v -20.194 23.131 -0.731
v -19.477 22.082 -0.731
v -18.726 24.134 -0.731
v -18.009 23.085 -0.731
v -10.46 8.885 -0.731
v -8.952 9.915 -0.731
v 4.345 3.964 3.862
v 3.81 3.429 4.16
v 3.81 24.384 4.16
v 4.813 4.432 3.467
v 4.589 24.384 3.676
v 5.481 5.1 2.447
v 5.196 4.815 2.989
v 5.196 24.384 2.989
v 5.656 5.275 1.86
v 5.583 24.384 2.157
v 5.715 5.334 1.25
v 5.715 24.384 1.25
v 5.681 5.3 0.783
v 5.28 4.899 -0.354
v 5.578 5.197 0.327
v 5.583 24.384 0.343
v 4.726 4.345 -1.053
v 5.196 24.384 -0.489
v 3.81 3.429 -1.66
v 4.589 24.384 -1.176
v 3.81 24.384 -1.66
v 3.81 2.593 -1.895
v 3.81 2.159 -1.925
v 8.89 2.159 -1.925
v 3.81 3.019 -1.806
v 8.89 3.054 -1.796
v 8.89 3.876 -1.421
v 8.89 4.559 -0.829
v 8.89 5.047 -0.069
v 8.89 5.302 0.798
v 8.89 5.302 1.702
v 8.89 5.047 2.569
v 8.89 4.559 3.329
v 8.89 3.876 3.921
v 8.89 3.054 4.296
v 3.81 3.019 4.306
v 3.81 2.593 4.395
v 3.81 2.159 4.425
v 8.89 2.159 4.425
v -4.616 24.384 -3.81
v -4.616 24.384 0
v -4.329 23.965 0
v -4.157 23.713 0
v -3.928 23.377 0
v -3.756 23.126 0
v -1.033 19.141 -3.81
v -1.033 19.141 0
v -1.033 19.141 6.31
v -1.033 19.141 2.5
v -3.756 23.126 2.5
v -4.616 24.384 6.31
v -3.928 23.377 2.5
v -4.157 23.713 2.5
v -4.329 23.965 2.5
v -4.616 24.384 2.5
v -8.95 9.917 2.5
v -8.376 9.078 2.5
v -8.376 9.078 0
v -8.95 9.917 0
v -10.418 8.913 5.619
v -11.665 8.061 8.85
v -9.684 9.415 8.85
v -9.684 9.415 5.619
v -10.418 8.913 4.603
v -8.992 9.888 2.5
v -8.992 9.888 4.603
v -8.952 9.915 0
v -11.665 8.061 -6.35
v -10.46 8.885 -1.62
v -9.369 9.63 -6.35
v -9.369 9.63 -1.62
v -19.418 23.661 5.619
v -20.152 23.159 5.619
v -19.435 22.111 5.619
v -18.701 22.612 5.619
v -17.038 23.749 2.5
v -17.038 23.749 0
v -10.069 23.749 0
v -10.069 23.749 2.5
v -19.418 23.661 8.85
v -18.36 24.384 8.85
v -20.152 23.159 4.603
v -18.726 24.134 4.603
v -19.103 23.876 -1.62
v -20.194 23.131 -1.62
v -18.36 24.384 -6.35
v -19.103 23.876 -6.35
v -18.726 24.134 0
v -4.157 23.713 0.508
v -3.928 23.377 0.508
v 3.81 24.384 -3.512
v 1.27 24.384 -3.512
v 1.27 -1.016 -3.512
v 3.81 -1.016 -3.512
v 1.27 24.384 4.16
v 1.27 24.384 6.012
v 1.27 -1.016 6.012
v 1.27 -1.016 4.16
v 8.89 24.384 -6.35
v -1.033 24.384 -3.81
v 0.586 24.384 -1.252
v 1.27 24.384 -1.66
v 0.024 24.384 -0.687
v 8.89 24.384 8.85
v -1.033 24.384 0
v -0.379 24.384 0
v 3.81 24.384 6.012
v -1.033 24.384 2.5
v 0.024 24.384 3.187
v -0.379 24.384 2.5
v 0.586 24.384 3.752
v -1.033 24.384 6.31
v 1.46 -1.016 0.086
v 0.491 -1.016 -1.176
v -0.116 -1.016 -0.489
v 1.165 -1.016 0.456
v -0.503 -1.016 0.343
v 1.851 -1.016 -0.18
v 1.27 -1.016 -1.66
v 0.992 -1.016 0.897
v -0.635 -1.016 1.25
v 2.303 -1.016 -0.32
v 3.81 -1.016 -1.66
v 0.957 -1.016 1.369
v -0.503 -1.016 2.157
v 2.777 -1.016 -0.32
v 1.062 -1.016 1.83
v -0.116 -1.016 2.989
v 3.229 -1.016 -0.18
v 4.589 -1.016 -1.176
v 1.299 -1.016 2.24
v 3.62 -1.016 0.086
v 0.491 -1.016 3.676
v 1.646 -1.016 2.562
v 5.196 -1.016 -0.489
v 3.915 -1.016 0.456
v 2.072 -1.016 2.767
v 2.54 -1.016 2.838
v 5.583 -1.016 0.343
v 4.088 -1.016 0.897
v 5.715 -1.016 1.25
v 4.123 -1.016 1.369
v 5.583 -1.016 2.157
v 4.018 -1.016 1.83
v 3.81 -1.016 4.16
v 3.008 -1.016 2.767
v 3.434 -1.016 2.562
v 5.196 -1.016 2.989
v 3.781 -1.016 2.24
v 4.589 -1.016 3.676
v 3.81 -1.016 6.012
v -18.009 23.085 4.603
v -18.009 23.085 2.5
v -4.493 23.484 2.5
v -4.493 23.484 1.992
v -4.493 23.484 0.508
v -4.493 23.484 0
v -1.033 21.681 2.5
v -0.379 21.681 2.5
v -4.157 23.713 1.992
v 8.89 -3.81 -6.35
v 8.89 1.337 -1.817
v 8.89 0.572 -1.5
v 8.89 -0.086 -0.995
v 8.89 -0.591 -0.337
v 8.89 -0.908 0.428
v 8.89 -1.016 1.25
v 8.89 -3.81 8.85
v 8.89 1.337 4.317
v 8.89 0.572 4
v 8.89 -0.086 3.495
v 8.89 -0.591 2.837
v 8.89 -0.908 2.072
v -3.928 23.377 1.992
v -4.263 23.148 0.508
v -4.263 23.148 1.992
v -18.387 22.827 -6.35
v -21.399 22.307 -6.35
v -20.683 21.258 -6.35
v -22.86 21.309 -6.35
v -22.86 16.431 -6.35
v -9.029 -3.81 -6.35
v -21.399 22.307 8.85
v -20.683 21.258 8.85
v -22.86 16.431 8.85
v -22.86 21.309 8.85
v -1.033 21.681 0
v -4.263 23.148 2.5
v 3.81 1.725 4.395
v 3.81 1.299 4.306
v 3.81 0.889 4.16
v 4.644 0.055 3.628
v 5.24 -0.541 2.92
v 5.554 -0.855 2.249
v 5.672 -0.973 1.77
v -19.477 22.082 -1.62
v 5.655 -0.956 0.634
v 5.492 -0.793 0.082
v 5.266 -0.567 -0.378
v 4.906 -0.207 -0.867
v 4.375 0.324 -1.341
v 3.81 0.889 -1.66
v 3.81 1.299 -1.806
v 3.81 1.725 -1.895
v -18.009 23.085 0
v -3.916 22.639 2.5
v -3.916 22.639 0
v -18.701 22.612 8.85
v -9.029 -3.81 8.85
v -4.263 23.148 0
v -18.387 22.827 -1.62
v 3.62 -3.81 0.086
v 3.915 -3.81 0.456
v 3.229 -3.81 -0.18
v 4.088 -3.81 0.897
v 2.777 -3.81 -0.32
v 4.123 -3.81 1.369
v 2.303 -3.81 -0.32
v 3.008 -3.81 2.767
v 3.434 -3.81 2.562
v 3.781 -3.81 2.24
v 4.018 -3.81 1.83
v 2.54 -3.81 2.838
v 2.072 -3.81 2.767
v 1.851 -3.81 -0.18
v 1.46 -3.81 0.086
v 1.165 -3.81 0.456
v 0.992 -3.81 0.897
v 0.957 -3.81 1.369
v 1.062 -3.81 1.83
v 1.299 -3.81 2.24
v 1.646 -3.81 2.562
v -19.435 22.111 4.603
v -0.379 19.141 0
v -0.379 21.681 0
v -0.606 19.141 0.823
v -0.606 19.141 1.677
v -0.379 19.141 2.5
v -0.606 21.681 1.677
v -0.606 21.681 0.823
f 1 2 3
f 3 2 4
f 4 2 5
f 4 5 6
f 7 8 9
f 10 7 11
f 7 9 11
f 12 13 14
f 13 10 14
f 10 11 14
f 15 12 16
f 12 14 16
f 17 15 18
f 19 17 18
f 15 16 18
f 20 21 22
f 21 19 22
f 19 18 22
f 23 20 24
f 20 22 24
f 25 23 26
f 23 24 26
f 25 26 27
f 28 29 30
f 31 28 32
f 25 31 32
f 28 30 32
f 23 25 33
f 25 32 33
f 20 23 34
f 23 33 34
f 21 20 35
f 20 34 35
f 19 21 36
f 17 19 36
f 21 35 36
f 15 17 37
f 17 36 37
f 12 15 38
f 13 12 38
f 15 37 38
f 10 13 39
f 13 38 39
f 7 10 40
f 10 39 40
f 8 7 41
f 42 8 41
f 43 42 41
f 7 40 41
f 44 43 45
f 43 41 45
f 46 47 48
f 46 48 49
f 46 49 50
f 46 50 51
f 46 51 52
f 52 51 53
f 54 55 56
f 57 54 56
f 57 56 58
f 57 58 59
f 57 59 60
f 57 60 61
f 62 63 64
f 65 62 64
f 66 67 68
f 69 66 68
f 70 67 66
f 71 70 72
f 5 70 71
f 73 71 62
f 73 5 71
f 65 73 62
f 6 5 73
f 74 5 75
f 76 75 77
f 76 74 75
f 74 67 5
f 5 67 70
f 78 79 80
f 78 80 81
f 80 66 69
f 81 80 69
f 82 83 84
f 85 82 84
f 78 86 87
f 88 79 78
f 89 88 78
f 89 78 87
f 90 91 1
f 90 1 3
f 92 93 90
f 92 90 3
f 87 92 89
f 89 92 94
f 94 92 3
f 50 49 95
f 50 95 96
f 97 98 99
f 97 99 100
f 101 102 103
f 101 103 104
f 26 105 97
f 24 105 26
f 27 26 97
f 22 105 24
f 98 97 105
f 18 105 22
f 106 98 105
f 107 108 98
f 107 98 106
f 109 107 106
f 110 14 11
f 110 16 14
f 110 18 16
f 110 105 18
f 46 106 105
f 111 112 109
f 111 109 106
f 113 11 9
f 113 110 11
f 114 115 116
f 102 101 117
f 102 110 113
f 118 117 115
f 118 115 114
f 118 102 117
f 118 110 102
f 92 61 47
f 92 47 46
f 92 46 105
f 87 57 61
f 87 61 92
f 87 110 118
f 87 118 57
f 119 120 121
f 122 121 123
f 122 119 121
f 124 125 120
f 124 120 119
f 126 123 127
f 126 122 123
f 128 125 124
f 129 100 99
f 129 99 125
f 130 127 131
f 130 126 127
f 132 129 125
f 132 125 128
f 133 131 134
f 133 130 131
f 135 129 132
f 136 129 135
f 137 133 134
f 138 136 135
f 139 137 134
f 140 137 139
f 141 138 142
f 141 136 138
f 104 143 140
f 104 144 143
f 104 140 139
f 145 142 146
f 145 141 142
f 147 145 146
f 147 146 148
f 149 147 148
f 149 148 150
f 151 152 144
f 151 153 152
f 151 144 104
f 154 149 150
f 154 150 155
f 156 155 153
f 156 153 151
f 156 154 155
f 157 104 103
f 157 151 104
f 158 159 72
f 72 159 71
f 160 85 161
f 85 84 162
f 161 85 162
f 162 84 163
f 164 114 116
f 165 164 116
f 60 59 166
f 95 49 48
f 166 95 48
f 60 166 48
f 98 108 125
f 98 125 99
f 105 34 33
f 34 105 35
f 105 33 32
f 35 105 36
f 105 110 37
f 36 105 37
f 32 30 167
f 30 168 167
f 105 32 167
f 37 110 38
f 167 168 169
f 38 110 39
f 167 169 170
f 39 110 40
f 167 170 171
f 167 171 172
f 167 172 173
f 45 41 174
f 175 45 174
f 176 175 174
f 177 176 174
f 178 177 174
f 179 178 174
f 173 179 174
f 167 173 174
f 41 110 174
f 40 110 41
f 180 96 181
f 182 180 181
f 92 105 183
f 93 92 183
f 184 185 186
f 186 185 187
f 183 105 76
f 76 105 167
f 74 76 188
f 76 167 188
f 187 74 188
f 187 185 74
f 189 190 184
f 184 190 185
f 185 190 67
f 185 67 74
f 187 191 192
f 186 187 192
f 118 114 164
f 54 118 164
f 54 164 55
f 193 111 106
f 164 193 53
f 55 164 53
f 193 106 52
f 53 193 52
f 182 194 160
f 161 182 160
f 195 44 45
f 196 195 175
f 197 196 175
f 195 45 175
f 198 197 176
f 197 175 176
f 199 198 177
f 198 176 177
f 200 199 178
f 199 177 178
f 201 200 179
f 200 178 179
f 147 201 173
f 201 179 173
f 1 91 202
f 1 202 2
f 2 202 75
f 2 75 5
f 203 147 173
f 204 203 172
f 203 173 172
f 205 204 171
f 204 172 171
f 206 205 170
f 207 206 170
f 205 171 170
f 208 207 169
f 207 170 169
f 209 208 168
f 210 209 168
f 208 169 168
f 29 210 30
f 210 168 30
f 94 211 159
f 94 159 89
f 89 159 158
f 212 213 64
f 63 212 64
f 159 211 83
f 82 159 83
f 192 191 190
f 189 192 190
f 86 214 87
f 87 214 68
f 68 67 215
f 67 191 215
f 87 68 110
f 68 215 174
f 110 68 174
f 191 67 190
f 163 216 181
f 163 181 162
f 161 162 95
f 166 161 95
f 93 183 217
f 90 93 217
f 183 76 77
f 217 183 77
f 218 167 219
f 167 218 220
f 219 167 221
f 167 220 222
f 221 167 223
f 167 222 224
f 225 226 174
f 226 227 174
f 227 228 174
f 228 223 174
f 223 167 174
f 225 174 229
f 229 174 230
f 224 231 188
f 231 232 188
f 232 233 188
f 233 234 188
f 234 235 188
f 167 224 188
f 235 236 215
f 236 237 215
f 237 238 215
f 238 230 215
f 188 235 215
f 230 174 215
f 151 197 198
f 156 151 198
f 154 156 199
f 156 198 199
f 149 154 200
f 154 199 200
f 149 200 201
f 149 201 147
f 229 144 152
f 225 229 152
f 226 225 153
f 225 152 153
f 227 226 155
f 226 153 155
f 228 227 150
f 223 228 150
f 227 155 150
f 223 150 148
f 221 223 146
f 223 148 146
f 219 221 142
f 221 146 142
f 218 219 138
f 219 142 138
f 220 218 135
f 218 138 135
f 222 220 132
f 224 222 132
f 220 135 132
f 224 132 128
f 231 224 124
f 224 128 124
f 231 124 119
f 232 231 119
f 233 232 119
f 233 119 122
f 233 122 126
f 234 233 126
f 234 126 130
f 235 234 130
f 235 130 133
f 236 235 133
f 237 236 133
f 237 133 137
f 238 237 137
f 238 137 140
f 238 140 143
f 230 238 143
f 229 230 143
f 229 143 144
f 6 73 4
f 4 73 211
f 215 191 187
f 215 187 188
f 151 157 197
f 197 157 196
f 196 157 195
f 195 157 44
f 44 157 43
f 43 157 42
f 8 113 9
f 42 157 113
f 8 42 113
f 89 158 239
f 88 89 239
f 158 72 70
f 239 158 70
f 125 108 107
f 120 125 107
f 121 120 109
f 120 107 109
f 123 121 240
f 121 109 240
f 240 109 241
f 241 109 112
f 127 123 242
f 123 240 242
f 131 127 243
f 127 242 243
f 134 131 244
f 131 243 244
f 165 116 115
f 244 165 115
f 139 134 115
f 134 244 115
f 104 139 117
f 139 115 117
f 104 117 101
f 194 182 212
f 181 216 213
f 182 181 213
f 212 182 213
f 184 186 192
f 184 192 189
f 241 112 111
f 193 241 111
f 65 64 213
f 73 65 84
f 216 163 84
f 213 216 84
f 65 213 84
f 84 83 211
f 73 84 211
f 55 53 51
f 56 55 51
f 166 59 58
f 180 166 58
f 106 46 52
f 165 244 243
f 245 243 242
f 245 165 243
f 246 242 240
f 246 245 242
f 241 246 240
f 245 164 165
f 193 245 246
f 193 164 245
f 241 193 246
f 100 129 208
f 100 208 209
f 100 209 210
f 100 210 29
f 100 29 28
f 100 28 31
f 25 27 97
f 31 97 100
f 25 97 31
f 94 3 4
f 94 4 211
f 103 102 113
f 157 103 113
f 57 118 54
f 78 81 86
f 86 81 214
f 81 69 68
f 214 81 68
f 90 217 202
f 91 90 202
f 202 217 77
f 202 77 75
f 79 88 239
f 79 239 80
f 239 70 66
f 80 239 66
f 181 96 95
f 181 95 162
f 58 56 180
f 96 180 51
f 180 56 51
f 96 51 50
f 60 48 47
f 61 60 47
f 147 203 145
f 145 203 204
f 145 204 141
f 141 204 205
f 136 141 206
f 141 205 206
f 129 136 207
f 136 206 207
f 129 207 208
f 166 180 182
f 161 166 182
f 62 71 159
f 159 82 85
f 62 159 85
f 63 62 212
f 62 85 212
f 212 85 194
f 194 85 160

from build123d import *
from build123d.topology import SkipClean

# Parameters (mm, degrees)
BOSS_EXTRUDE1_DEPTH     = 2.5
BOSS_EXTRUDE1_2_DEPTH   = 2.5
BOSS_EXTRUDE2_DEPTH     = 6.35
BOSS_EXTRUDE3_DEPTH     = 6.35
SKETCH4_R               = 3.175
CUT_EXTRUDE1_DEPTH      = 25.4
SKETCH5_R               = 1.5875
CUT_EXTRUDE2_DEPTH      = 25.4
CUT_EXTRUDE3_DEPTH      = 25.4
CUT_EXTRUDE4_REACH      = 43
CUT_EXTRUDE4_END_RADIUS = 3.175
CUT_EXTRUDE5_REACH      = 39.36
SKETCH8_W               = 2.54
SKETCH8_H               = 9.525
SKETCH9_W               = 0.7112
SKETCH9_H               = 15.2
BOSS_EXTRUDE4_DEPTH     = 17
BOSS_EXTRUDE5_DEPTH     = 1.016
SKETCH11_W              = 1.176658287
SKETCH11_H              = 2.5
SKETCH11_W_2            = 2.636987944
SKETCH11_H_2            = 15.2
BOSS_EXTRUDE6_DEPTH     = 1.27
CUT_EXTRUDE6_DEPTH      = 38.864332241
BOSS_EXTRUDE7_START     = 2.54
BOSS_EXTRUDE7_DEPTH     = 2.54
BOSS_EXTRUDE8_DEPTH     = 2.54
BOSS_EXTRUDE9_DEPTH     = 0.508
BOSS_EXTRUDE10_DEPTH    = 0.508
CUT_EXTRUDE7_DEPTH      = 3.81
CUT_EXTRUDE8_DEPTH      = 3.81
BOSS_EXTRUDE11_DEPTH    = 3.81


with BuildPart() as part:
    # Sketch1 → Boss-Extrude1 (new body)
    with BuildSketch(Plane.XY):
        Polygon((5.08, 0), (0, 0), (0, 19.141079028), (-1.033059908, 19.141079028), (-3.75575709, 23.125698967), (-8.376397661, 9.077684872), (-11.679025045, 6.820994294), (-21.26996, 20.857160675), (-22.86, 19.770683798), (-22.86, -3.81), (8.89, -3.81), (8.89, 24.384), (5.08, 24.384), align=None)
    extrude(amount=BOSS_EXTRUDE1_DEPTH)



with BuildPart() as body_2:
    # Sketch1 → Boss-Extrude1 2 (new body)
    with BuildSketch(Plane.XY):
        Polygon((-10.069369191, 23.749), (-4.328956497, 23.964566322), (-4.615556201, 24.384), (-16.108492032, 24.384), (-17.03780348, 23.749), align=None)
    extrude(amount=BOSS_EXTRUDE1_2_DEPTH)


with BuildPart() as part_1:
    add(part.part)

    add(body_2.part)  # Boss-Extrude2 merges body 2
    # Sketch2 → Boss-Extrude2 (add)
    with BuildSketch(Plane.XY.offset(2.5)):
        Polygon((-11.679025045, 6.820994294), (-21.26996, 20.857160675), (-22.86, 19.770683798), (-22.86, -3.81), (8.89, -3.81), (8.89, 24.384), (5.08, 24.384), (5.08, 0), (0, 0), (0, 19.141079028), (-1.033059908, 19.141079028), (-3.75575709, 23.125698967), (-8.376397661, 9.077684872), align=None)
        Polygon((-16.108492032, 24.384), (-18.00931945, 23.085161582), (-8.418384495, 9.048995201), (-8.376397661, 9.077684872), (-3.75575709, 23.125698967), (-1.033059908, 19.141079028), (0, 19.141079028), (0, 0), (5.08, 0), (5.08, 24.384), align=None)
    extrude(amount=BOSS_EXTRUDE2_DEPTH)

    # Sketch3 → Boss-Extrude3 (add)
    with BuildSketch(Plane(origin=(0, 0, 0), x_dir=(-1, 0, 0), z_dir=(0, 0, -1))):
        Polygon((-8.89, 24.384), (-8.89, -3.81), (22.86, -3.81), (22.86, 19.770683798), (21.26996, 20.857160675), (11.679025045, 6.820994294), (8.376397661, 9.077684872), (18.00931945, 23.085161582), (16.108492032, 24.384), align=None)
    extrude(amount=BOSS_EXTRUDE3_DEPTH)

    # Sketch4 → Cut-Extrude1 (cut)
    with BuildSketch(Plane(origin=(0, 24.384, 0), x_dir=(1, 0, 0), z_dir=(0, 1, 0))):
        with Locations(Location((2.54, -1.25, 0), (0, 0, 270))):
            Circle(SKETCH4_R)
    extrude(amount=-CUT_EXTRUDE1_DEPTH, mode=Mode.SUBTRACT)

    # Sketch5 → Cut-Extrude2 (cut)
    with BuildSketch(Plane(origin=(0, -1.016, 0), x_dir=(1, 0, 0), z_dir=(0, 1, 0))):
        with Locations(Location((2.54, -1.25, 0), (0, 0, 270))):
            Circle(SKETCH5_R)
    extrude(amount=-CUT_EXTRUDE2_DEPTH, mode=Mode.SUBTRACT)

    # Sketch6 → Cut-Extrude3 (cut)
    with BuildSketch(Plane.XY.offset(8.85)):
        Polygon((-22.86, 16.430904611), (-9.029357481, -3.81), (-22.86, -3.81), align=None)
    extrude(amount=-CUT_EXTRUDE3_DEPTH, mode=Mode.SUBTRACT)

    # Cut-Extrude4: up to this cylinder (the profile starts outside it)
    with SkipClean():  # the faces are left unmerged after this step: merging them gives an invalid solid
        cut_extrude4_end = Plane(origin=(2.54, 2.159, 1.25), z_dir=(0, 1, 0)) * Cylinder(CUT_EXTRUDE4_END_RADIUS, 96.045024, mode=Mode.PRIVATE)
        # Sketch7 → Cut-Extrude4 (cut, up to the surface)
        with BuildSketch(Plane(origin=(8.89, 0, 0), x_dir=(0, 0, -1), z_dir=(1, 0, 0)), mode=Mode.PRIVATE) as cut_extrude4_sk1:
            with BuildLine():
                ThreePointArc((1.925, 2.159), (-1.25, 5.334), (-4.425, 2.159))
                Line((-4.425, 2.159), (1.925, 2.159))
            make_face()
        cut_extrude4_tool1 = extrude(cut_extrude4_sk1.sketch, amount=-CUT_EXTRUDE4_REACH, mode=Mode.PRIVATE) - cut_extrude4_end
        add(cut_extrude4_tool1.solids().sort_by_distance((8.89, 3.506512, 1.25))[0], mode=Mode.SUBTRACT)
        # Sketch7 → Cut-Extrude4 (cut, up to the surface)
        with BuildSketch(Plane(origin=(8.89, 0, 0), x_dir=(0, 0, -1), z_dir=(1, 0, 0)), mode=Mode.PRIVATE) as cut_extrude4_sk2:
            with BuildLine():
                Line((1.925, 2.159), (-4.425, 2.159))
                ThreePointArc((-4.425, 2.159), (-3.49506403, -0.08606403), (-1.25, -1.016))
                ThreePointArc((-1.25, -1.016), (0.99506403, -0.08606403), (1.925, 2.159))
            make_face()
        cut_extrude4_tool2 = extrude(cut_extrude4_sk2.sketch, amount=-CUT_EXTRUDE4_REACH, mode=Mode.PRIVATE) - cut_extrude4_end
        add(cut_extrude4_tool2.solids().sort_by_distance((8.89, 0.811488, 1.25))[0], mode=Mode.SUBTRACT)
        # Sketch7 → Cut-Extrude4 (cut, up to the surface)
        with BuildSketch(Plane(origin=(8.89, 0, 0), x_dir=(0, 0, -1), z_dir=(1, 0, 0)), mode=Mode.PRIVATE) as cut_extrude4_sk3:
            with BuildLine():
                ThreePointArc((1.925, 2.159), (-1.25, 5.334), (-4.425, 2.159))
                Line((-4.425, 2.159), (1.925, 2.159))
            make_face()
        cut_extrude4_tool3 = extrude(cut_extrude4_sk3.sketch, amount=-CUT_EXTRUDE4_REACH, mode=Mode.PRIVATE) - cut_extrude4_end
        add(cut_extrude4_tool3.solids().sort_by_distance((8.89, 3.506512, 1.25))[0], mode=Mode.SUBTRACT)
        # Sketch7 → Cut-Extrude4 (cut, up to the surface)
        with BuildSketch(Plane(origin=(8.89, 0, 0), x_dir=(0, 0, -1), z_dir=(1, 0, 0)), mode=Mode.PRIVATE) as cut_extrude4_sk4:
            with BuildLine():
                Line((1.925, 2.159), (-4.425, 2.159))
                ThreePointArc((-4.425, 2.159), (-3.49506403, -0.08606403), (-1.25, -1.016))
                ThreePointArc((-1.25, -1.016), (0.99506403, -0.08606403), (1.925, 2.159))
            make_face()
        cut_extrude4_tool4 = extrude(cut_extrude4_sk4.sketch, amount=-CUT_EXTRUDE4_REACH, mode=Mode.PRIVATE) - cut_extrude4_end
        add(cut_extrude4_tool4.solids().sort_by_distance((8.89, 0.811488, 1.25))[0], mode=Mode.SUBTRACT)

    # Cut-Extrude5: up to this face of the body (flat: up to its plane)
    cut_extrude5_end = Plane(part_1.part.faces().sort_by_distance((4.72156403, -1.016, 3.43156403))[0])
    # Sketch8 → Cut-Extrude5 (cut, up to the picked face)
    with BuildSketch(Plane(origin=(0, 24.384, 0), x_dir=(1, 0, 0), z_dir=(0, 1, 0)), mode=Mode.PRIVATE) as cut_extrude5_sk1:
        with Locations((2.54, -1.25)):
            Rectangle(SKETCH8_W, SKETCH8_H)
    cut_extrude5_tool1 = split(extrude(cut_extrude5_sk1.sketch, amount=-CUT_EXTRUDE5_REACH, mode=Mode.PRIVATE), bisect_by=cut_extrude5_end, keep=Keep.BOTH, mode=Mode.PRIVATE)
    add(cut_extrude5_tool1.solids().sort_by(Axis((2.54, 24.384, 1.25), (0, -1, 0)))[0], mode=Mode.SUBTRACT)

    # Sketch9 → Boss-Extrude4 (add)
    with BuildSketch(Plane(origin=(-6.894633763, 10.090176515, 0), x_dir=(0.825656845959394, 0.5641726444275594, 0), z_dir=(-0.5641726444275594, 0.825656845959394, 0))):
        with Locations((-5.439048594, -1.25)):
            Rectangle(SKETCH9_W, SKETCH9_H)
        Polygon((-1.794648594, 6.35), (-2.302648594, 6.35), (-2.302648594, 1.6202), (-3.623501238, 1.6202), (-3.623501238, 0.7312), (-1.794648594, 0.7312), align=None)
        Polygon((-1.845501238, -8.85), (-1.845501238, -4.6028), (-3.572648594, -4.6028), (-3.572648594, -5.6188), (-2.683648594, -5.6188), (-2.683648594, -8.85), align=None)
    extrude(amount=BOSS_EXTRUDE4_DEPTH)

    # Sketch10 → Boss-Extrude5 (add)
    with BuildSketch(Plane(origin=(-6.894633763, 10.090176515, 0), x_dir=(0.8256568459593948, 0.5641726444275585, 0), z_dir=(-0.5641726444275585, 0.8256568459593948, 0))):
        Polygon((-5.083448594, -8.85), (-2.683648594, -8.85), (-2.683648594, -5.6188), (-3.572648594, -5.6188), (-3.572648594, -4.6028), (-1.845501238, -4.6028), (-1.845501238, -2.5), (-1.794648594, -2.5), (-1.794648594, 0), (-1.794648594, 0.7312), (-3.623501238, 0.7312), (-3.623501238, 1.6202), (-2.302648594, 1.6202), (-2.302648594, 6.35), (-5.083448594, 6.35), align=None)
    extrude(amount=BOSS_EXTRUDE5_DEPTH)

    # Sketch11 → Boss-Extrude6 (add)
    with BuildSketch(Plane(origin=(-16.485568719, 24.126342896, 0), x_dir=(0.8256568459593935, 0.5641726444275603, 0), z_dir=(-0.5641726444275603, 0.8256568459593935, 0))):
        with Locations((-1.257172095, -1.25)):
            Rectangle(SKETCH11_W, SKETCH11_H)
        Polygon((-3.623501238, 1.6202), (-3.623501238, 0.7312), (-1.845501238, 0.7312), (-1.845501238, 0), (-0.668842951, 0), (-0.668842951, -2.5), (-1.845501238, -2.5), (-1.845501238, -4.6028), (-3.572648594, -4.6028), (-3.572648594, -5.6188), (-2.683648594, -5.6188), (-2.683648594, -8.85), (0.456699038, -8.85), (0.456699038, 6.35), (-2.302648594, 6.35), (-2.302648594, 1.6202), align=None)
        with Locations((-6.401942566, -1.25)):
            Rectangle(SKETCH11_W_2, SKETCH11_H_2)
    extrude(amount=BOSS_EXTRUDE6_DEPTH)

    # Sketch12 → Cut-Extrude6 (cut, through all)
    with BuildSketch(Plane.XY.offset(8.85)):
        Polygon((-16.108492032, 24.384), (-18.359576008, 24.384), (-16.82499129, 25.432584194), align=None)
        Polygon((-22.86, 19.770683798), (-22.86, 21.308853083), (-23.576499258, 20.819267993), align=None)
    extrude(amount=-CUT_EXTRUDE6_DEPTH, mode=Mode.SUBTRACT)

    # Sketch13 → Boss-Extrude7 (add)
    with BuildSketch(Plane(origin=(0, 19.141079028, 0), x_dir=(1, 0, 0), z_dir=(0, 1, 0)).offset(BOSS_EXTRUDE7_START)):
        with BuildLine():
            Line((-0.378582704, 0), (-1.033059908, 0))
            Line((-1.033059908, 0), (-1.033059908, -2.5))
            Line((-1.033059908, -2.5), (-0.378582704, -2.5))
            ThreePointArc((-0.378582704, -2.5), (-0.635, -1.25), (-0.378582704, 0))
        make_face()
    extrude(amount=-BOSS_EXTRUDE7_DEPTH)

    # Sketch15 → Boss-Extrude8 (add)
    with BuildSketch(Plane.XY):
        Polygon((-4.156996675, 23.712906116), (-4.328956497, 23.964566322), (-4.808856613, 23.946544917), (-4.492543617, 23.483626353), align=None)
        Polygon((-3.75575709, 23.125698967), (-3.927716912, 23.377359173), (-4.263263855, 23.148079411), (-3.915700647, 22.639426706), align=None)
    extrude(amount=BOSS_EXTRUDE8_DEPTH)

    # Sketch16 → Boss-Extrude9 (add)
    with BuildSketch(Plane.XY):
        Polygon((-4.263263855, 23.148079411), (-4.492543617, 23.483626353), (-4.156996675, 23.712906116), (-3.927716912, 23.377359173), align=None)
    extrude(amount=BOSS_EXTRUDE9_DEPTH)

    # Sketch17 → Boss-Extrude10 (add)
    with BuildSketch(Plane(origin=(0, 0, 2.5), x_dir=(-1, 0, 0), z_dir=(0, 0, -1))):
        Polygon((4.263263855, 23.148079411), (4.492543617, 23.483626353), (4.156996675, 23.712906116), (3.927716912, 23.377359173), align=None)
    extrude(amount=BOSS_EXTRUDE10_DEPTH)

    # Sketch18 → Cut-Extrude7 (cut)
    with BuildSketch(Plane(origin=(0, 0, 2.5), x_dir=(-1, 0, 0), z_dir=(0, 0, -1))):
        Polygon((1.033059908, 24.384), (1.033059908, 21.681079028), (1.033059908, 19.141079028), (4.615556201, 24.384), align=None)
    extrude(amount=-CUT_EXTRUDE7_DEPTH, mode=Mode.SUBTRACT)

    # Sketch19 → Cut-Extrude8 (cut)
    with BuildSketch(Plane.XY):
        Polygon((-1.033059908, 19.141079028), (-1.033059908, 21.681079028), (-1.033059908, 24.384), (-4.615556201, 24.384), align=None)
    extrude(amount=-CUT_EXTRUDE8_DEPTH, mode=Mode.SUBTRACT)

    # Sketch20 → Boss-Extrude11 (add)
    with BuildSketch(Plane.XY):
        Polygon((-10.069369191, 23.749), (-4.492543617, 23.483626353), (-4.808856613, 23.946544917), align=None)
    extrude(amount=BOSS_EXTRUDE11_DEPTH)


solid = part_1.part
